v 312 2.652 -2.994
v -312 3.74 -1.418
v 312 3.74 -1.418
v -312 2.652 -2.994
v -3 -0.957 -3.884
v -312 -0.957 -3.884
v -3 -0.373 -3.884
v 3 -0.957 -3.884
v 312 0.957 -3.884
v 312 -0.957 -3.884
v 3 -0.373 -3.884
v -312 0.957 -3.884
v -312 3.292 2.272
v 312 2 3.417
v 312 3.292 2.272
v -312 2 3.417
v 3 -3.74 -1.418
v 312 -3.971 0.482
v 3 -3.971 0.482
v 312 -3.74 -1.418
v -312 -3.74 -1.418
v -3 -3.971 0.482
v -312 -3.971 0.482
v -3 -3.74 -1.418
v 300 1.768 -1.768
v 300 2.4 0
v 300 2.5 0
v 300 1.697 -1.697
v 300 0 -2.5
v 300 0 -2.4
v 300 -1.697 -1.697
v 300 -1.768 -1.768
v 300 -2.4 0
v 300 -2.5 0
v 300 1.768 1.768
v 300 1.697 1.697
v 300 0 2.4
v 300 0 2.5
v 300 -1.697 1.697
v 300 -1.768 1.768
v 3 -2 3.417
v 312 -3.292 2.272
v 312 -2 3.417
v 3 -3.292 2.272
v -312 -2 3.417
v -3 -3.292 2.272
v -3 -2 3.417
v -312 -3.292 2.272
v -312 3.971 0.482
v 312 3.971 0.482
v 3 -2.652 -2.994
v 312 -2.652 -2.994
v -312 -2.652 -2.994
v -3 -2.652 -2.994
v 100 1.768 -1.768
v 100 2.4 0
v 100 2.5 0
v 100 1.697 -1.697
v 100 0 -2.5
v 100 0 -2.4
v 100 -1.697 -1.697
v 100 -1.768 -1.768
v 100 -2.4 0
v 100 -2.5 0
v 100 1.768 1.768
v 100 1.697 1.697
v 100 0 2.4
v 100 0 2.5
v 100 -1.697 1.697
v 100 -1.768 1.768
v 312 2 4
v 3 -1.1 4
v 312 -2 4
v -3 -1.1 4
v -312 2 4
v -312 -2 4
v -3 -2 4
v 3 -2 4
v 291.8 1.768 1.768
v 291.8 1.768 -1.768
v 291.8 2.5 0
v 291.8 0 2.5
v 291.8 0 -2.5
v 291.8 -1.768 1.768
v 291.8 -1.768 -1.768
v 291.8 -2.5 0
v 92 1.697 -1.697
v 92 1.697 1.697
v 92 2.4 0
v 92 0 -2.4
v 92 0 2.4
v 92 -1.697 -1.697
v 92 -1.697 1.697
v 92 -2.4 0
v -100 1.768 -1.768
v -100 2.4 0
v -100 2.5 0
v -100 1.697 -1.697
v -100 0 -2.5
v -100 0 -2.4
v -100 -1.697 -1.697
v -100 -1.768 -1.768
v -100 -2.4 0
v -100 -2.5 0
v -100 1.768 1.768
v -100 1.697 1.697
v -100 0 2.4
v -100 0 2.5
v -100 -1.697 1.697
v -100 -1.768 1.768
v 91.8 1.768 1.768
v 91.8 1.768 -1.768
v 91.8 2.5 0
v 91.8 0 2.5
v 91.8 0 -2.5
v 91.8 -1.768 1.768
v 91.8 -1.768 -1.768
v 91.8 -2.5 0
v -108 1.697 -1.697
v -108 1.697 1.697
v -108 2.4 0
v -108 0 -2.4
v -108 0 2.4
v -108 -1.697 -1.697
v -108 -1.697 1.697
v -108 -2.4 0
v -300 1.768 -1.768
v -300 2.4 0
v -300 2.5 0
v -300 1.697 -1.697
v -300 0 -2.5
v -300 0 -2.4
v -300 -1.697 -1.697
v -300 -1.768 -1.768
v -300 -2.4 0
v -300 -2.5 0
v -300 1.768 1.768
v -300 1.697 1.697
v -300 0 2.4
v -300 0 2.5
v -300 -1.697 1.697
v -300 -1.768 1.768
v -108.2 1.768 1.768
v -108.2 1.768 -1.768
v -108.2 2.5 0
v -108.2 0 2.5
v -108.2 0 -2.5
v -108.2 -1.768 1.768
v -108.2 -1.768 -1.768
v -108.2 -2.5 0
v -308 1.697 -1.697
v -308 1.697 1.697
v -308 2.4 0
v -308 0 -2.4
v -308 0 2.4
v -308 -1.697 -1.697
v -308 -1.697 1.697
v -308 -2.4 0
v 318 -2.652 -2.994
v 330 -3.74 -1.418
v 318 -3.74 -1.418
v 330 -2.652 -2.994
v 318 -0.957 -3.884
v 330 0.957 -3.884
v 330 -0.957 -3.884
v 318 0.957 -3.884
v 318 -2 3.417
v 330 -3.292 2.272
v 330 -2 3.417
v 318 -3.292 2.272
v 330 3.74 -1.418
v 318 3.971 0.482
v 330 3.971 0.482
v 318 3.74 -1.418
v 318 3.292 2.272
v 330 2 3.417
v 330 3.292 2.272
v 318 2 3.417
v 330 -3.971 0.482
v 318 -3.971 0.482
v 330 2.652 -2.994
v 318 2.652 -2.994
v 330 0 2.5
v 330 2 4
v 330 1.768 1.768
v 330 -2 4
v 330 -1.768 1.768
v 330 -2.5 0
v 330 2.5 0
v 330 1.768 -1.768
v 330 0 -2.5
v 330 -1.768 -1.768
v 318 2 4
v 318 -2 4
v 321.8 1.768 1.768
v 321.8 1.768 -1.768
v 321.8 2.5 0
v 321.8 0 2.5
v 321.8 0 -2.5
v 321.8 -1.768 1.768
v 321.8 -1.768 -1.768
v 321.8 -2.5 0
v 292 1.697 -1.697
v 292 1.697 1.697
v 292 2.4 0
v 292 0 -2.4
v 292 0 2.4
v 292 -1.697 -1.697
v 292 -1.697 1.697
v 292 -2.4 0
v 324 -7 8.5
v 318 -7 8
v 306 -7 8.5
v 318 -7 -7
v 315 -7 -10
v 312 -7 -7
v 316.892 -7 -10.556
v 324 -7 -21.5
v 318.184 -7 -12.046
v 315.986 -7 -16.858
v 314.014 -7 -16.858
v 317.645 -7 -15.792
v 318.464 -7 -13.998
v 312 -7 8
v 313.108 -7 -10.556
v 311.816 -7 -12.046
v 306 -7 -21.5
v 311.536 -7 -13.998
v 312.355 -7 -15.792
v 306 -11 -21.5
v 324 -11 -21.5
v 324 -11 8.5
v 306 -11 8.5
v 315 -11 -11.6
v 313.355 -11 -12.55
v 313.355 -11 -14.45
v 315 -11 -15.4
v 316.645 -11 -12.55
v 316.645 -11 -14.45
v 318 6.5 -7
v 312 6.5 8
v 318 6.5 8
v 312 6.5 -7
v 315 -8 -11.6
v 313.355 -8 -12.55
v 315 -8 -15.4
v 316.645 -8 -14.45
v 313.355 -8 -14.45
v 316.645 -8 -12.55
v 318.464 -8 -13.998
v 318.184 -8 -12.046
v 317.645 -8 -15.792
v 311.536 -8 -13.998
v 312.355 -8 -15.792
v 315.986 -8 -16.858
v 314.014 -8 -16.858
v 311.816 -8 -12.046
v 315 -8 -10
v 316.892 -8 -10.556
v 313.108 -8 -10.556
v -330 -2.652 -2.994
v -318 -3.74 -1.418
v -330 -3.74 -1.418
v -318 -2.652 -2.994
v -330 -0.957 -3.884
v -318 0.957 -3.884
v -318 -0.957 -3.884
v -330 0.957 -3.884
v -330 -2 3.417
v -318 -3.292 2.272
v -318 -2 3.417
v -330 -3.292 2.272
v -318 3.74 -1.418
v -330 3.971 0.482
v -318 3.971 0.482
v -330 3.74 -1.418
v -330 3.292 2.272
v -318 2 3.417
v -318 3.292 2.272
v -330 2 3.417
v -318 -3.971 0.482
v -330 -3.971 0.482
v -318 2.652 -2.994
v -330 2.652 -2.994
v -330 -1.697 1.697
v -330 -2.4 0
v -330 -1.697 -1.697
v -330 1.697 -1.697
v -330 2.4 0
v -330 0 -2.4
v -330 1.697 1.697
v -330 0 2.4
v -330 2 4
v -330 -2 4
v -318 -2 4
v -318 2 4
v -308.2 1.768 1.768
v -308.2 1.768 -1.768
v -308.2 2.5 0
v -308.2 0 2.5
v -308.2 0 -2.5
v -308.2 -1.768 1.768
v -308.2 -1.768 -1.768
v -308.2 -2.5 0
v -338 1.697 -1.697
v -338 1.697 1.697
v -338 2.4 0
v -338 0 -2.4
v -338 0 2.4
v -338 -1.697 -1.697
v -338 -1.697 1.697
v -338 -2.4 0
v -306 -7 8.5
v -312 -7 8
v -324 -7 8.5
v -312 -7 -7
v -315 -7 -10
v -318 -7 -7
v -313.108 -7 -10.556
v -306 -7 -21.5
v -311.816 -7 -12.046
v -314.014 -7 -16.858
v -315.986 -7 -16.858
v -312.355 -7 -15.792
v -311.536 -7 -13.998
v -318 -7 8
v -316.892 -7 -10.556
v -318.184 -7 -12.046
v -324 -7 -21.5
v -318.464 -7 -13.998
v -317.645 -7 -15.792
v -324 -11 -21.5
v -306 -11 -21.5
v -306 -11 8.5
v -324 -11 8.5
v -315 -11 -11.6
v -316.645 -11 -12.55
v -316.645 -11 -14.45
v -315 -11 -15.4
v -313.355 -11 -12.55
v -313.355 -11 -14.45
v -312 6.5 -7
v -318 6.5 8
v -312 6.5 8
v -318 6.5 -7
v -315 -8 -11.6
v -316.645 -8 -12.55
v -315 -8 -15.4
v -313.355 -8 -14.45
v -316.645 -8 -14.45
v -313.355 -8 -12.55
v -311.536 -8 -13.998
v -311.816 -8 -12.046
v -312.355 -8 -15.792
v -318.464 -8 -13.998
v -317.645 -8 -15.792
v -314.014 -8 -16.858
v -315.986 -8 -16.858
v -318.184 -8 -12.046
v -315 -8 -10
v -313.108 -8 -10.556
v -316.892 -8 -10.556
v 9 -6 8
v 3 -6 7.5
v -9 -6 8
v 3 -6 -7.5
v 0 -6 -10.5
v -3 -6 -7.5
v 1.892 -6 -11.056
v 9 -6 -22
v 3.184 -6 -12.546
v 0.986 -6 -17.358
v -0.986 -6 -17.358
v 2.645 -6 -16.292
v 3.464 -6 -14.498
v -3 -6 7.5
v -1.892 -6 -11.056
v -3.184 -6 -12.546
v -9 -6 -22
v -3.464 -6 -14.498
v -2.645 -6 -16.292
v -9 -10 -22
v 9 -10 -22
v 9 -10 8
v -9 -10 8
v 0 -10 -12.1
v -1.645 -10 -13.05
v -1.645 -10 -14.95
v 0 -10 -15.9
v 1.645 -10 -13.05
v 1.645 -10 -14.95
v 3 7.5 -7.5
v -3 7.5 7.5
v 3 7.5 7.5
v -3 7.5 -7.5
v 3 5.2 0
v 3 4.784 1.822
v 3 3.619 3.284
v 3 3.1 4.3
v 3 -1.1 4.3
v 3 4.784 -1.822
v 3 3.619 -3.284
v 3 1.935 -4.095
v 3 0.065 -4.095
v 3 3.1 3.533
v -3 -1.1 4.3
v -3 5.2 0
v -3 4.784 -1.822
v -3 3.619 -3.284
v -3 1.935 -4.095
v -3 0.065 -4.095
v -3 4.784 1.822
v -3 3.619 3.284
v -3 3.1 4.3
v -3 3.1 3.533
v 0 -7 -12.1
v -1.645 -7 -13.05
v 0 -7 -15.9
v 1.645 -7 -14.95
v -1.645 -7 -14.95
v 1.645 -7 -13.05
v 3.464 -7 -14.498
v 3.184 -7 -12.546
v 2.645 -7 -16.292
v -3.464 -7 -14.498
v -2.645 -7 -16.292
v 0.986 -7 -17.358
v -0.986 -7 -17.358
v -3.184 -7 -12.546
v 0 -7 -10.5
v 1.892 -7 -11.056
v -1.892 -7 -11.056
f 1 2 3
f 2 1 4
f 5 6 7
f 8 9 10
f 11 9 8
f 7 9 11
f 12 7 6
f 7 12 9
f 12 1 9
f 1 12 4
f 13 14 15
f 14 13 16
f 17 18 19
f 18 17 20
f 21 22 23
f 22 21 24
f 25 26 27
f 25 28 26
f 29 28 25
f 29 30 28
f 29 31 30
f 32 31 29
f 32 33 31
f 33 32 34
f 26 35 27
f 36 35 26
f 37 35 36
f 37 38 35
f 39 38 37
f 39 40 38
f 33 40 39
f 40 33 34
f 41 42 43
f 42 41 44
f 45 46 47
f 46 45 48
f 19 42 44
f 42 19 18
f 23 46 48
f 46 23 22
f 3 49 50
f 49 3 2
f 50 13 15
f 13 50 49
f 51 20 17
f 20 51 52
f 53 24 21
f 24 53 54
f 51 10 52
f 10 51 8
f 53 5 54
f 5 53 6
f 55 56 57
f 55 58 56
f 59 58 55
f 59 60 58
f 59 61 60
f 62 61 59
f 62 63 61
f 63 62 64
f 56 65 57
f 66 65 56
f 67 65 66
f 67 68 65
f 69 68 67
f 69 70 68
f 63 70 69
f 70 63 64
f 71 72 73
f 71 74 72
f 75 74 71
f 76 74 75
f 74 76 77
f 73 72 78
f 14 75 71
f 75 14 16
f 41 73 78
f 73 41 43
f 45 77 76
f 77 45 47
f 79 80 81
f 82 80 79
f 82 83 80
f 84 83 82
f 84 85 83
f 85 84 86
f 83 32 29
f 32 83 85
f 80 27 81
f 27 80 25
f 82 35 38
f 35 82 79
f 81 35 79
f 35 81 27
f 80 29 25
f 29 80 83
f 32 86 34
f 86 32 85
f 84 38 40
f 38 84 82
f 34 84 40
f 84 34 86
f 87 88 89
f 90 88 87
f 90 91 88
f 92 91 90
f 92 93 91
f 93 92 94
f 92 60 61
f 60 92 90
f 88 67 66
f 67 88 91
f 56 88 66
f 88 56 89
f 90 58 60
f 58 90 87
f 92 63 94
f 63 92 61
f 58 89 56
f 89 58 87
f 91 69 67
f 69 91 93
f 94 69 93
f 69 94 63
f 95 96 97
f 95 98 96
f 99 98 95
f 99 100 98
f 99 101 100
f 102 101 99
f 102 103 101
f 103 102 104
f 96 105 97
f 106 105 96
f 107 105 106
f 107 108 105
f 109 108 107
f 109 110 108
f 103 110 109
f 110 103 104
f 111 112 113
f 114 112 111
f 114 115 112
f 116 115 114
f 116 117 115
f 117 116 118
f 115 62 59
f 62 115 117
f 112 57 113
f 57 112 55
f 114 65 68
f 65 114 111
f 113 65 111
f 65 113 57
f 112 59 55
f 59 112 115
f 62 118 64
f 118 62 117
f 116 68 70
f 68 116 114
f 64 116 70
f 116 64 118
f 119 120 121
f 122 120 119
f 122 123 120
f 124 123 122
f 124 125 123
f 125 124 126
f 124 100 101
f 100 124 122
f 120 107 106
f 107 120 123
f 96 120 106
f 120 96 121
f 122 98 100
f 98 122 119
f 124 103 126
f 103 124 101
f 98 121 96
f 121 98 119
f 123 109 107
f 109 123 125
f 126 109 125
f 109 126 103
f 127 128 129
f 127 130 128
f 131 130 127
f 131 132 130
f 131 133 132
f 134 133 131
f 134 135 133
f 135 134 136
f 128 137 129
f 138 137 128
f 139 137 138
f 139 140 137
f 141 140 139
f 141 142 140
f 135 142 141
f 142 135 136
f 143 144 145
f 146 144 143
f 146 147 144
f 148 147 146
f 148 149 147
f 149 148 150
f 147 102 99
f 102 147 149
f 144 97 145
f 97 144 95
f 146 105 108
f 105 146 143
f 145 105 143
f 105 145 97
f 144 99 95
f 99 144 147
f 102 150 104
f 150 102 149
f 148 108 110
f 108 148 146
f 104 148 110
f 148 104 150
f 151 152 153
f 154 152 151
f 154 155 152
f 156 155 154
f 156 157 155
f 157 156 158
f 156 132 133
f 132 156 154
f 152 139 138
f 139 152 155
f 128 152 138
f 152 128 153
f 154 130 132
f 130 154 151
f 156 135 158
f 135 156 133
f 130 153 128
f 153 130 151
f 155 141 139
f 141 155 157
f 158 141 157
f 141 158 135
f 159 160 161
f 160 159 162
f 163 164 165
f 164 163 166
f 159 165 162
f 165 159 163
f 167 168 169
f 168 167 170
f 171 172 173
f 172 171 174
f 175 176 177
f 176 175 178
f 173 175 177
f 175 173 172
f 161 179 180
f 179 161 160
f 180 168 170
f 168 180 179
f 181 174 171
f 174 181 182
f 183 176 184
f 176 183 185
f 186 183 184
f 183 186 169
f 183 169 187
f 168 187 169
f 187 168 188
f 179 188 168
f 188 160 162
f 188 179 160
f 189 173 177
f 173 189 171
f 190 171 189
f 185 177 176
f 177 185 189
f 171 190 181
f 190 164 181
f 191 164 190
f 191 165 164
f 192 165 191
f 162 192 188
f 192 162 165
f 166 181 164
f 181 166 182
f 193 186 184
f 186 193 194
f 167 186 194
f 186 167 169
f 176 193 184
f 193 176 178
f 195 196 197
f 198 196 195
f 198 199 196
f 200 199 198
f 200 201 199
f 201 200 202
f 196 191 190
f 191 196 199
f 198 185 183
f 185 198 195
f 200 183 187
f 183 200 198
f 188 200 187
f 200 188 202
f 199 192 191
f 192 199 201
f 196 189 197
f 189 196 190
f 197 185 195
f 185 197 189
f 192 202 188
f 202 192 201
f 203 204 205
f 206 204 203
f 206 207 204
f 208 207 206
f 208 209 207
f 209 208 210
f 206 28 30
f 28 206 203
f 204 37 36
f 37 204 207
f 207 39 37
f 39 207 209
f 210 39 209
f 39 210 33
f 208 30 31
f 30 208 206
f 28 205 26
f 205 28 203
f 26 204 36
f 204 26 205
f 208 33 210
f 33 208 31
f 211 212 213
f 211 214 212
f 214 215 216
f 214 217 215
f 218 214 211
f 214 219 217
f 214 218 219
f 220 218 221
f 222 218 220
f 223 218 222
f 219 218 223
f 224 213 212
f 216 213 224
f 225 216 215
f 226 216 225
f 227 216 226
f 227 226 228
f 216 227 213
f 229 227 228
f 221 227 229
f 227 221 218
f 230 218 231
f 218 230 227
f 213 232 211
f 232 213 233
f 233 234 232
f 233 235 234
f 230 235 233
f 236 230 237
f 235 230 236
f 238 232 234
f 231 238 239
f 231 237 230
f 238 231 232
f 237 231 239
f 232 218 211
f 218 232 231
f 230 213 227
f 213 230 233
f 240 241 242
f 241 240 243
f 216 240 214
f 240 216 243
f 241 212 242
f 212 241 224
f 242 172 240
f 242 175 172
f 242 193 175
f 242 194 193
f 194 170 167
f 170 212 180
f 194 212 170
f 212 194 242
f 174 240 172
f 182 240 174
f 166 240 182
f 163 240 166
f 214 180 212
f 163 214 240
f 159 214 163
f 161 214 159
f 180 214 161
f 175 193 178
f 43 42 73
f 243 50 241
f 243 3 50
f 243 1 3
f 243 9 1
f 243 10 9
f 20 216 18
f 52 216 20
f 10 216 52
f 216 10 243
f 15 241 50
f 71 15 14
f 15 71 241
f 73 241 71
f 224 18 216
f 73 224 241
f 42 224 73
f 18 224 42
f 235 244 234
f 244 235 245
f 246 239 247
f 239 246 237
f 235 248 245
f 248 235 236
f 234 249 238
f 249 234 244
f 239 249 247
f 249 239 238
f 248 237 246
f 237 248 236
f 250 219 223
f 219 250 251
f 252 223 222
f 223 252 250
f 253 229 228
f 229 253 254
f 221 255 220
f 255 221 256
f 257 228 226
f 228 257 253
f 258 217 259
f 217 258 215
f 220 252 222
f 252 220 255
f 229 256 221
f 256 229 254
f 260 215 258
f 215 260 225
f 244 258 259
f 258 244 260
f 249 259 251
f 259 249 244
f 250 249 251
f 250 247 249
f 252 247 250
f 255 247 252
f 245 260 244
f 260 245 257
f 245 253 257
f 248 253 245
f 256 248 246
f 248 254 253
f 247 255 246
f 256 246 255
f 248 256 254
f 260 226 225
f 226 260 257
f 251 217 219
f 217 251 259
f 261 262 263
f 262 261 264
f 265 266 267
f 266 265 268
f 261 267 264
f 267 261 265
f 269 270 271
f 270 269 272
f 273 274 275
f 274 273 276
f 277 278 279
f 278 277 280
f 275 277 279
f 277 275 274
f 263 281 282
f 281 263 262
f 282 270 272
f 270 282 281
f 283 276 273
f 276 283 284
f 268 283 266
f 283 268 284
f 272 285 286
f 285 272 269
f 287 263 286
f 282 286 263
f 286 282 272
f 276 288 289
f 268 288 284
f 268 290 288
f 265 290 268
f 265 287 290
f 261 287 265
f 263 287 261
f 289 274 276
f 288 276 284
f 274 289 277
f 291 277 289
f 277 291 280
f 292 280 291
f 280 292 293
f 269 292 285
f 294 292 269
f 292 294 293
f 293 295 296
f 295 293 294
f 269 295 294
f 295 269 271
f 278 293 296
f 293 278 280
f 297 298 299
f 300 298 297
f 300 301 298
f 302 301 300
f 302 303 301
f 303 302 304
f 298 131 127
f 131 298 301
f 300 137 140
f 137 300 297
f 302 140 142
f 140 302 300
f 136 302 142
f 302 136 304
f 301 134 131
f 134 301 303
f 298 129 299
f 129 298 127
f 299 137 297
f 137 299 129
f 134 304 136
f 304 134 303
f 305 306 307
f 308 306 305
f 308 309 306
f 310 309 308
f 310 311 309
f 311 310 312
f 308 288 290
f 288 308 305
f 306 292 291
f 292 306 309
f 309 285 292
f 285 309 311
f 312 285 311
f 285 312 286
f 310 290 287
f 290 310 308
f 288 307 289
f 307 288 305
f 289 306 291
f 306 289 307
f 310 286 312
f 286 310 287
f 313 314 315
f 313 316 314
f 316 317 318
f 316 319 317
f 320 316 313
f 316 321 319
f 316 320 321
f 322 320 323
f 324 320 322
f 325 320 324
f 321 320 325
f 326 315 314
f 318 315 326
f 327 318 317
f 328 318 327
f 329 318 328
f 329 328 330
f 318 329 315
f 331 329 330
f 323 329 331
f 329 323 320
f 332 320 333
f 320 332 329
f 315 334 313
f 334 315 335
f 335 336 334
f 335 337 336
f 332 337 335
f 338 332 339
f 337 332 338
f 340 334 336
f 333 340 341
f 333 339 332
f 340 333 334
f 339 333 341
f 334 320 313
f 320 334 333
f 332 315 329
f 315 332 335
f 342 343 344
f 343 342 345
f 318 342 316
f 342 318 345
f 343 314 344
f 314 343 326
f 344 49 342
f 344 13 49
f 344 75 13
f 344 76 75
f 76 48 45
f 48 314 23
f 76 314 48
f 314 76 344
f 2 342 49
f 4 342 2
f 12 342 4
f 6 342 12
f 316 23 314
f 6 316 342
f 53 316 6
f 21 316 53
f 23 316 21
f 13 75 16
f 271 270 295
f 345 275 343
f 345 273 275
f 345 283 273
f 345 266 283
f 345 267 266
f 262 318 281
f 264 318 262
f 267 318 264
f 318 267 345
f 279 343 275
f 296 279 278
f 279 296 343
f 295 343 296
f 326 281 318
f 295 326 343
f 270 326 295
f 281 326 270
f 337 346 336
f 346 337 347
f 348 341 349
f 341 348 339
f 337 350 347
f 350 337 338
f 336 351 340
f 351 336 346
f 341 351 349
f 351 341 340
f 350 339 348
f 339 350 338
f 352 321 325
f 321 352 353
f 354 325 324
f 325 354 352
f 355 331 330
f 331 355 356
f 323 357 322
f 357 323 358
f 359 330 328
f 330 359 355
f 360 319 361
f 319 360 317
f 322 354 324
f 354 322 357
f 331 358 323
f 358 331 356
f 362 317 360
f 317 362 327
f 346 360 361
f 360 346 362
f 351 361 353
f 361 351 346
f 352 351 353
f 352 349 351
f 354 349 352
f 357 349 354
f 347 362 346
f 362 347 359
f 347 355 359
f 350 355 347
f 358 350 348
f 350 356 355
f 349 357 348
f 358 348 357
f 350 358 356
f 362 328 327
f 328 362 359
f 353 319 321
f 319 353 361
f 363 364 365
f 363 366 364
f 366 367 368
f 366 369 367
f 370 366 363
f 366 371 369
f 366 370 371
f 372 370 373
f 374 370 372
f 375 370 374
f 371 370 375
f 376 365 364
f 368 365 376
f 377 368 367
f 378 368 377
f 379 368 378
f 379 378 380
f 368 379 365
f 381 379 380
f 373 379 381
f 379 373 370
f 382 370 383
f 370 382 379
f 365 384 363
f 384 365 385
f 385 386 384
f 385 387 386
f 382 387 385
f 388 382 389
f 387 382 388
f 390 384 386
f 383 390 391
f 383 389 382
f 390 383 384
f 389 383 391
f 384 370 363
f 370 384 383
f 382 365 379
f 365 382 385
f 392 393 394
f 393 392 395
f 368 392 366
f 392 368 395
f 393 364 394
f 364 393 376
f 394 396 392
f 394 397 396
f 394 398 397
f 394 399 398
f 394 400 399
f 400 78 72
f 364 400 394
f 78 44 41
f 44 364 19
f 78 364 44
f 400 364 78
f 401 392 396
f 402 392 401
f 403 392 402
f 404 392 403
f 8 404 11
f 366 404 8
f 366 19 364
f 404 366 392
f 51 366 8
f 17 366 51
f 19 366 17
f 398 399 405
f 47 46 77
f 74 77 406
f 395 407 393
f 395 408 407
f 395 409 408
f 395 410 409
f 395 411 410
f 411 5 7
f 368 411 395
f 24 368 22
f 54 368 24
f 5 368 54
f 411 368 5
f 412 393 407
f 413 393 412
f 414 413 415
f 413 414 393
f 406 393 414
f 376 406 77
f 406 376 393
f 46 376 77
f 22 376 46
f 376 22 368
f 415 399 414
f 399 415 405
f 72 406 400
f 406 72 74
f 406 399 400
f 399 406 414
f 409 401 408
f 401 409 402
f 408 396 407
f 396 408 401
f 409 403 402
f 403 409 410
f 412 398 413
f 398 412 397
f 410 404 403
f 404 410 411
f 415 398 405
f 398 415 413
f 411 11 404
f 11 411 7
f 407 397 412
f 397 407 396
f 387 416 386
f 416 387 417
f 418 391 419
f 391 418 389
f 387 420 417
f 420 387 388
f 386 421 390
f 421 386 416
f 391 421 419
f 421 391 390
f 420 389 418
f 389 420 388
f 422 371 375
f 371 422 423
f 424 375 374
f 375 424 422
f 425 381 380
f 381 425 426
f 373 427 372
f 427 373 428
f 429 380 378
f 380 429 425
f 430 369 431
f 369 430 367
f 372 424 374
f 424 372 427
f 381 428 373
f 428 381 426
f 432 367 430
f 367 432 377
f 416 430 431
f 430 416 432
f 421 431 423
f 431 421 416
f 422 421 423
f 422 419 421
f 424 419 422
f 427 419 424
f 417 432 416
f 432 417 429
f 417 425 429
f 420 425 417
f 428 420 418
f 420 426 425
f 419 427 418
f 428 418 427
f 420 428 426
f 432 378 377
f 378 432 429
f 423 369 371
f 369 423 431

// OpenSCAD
atom_len = 200;

long_rod_v = 1;
rod_atom_v = 0;
rod_hook_v = 0;
end_hook_v = 0;

module rod_atom(rod_len) {
difference () {
union() {
rotate(90,[0,1,0]) 
cylinder(h=rod_len,d=8,center=true);
translate([0,0,-3])
cube([rod_len,4,2],center=true);
}
translate([-rod_len/2+4,0,0])
rotate(90,[0,1,0])
cylinder(h=8.4,d=5,center=true);
}
translate([rod_len/2+4,0,0])
rotate(90,[0,1,0])
cylinder(h=8,d=4.8,center=true);
}

module rod_hook() {
rotate(-90,[0,1,0])
difference() {
union() {
translate([0,-9,0])
cube([4,18,30]);
translate([10,0,8])
cube([15,6,15],center=true);
}

translate([2,0,22])
rotate(90,[0,1,0])
cylinder(h=5,d=3.8,center=true);
translate([4,0,22])
rotate(90,[0,1,0])
cylinder(h=2,d=7,center=true);
translate([11,0,8]) {
rotate(90,[1,0,0]) {
translate([0,-3.2,0])
cube([4.2,2.2,20],center=true);
cylinder(h=10,d=8.4,center=true);
}
}
}
}

module end_hook(left) {
    translate([-8.5,0,11])
    rotate(90,[0,0,1])
    rotate(-90,[1,0,0])
    if (left) {
    mirror([1,0,0])
    rod_atom(30);
    } else {
    rod_atom(30);
    }
    translate([-7,0,10])
    cube([13,6,12],center=true);
    rod_hook();
}

module long_rod() {
rotate(180,[0,0,1])
rotate(180,[1,0,0]) {
for (x = [-atom_len:atom_len:atom_len]) {
    translate([x,0,0])
    rod_atom(atom_len);
}

translate([-314,8,-11])
rotate(90,[0,0,1])
rotate(90,[0,1,0])
translate([-2.5,1.0,-19])
color("red")
end_hook(1);
translate([300,8,-11])
rotate(90,[0,0,1])
rotate(90,[0,1,0])
translate([-2.5,-15.0,-19])
color("red")
end_hook(1);
color("green")
rotate(90,[0,0,1])
rotate(90,[0,1,0])
translate([8,0,-10])
rod_hook();
}
}

if (long_rod_v) {
long_rod();
}

if (rod_hook_v) {
rod_hook();
}

if (end_hook_v) {
end_hook(1);
}

if (rod_atom_v) {
 rotate(-90,[0,0,1])
 rod_atom(atom_len);
}
